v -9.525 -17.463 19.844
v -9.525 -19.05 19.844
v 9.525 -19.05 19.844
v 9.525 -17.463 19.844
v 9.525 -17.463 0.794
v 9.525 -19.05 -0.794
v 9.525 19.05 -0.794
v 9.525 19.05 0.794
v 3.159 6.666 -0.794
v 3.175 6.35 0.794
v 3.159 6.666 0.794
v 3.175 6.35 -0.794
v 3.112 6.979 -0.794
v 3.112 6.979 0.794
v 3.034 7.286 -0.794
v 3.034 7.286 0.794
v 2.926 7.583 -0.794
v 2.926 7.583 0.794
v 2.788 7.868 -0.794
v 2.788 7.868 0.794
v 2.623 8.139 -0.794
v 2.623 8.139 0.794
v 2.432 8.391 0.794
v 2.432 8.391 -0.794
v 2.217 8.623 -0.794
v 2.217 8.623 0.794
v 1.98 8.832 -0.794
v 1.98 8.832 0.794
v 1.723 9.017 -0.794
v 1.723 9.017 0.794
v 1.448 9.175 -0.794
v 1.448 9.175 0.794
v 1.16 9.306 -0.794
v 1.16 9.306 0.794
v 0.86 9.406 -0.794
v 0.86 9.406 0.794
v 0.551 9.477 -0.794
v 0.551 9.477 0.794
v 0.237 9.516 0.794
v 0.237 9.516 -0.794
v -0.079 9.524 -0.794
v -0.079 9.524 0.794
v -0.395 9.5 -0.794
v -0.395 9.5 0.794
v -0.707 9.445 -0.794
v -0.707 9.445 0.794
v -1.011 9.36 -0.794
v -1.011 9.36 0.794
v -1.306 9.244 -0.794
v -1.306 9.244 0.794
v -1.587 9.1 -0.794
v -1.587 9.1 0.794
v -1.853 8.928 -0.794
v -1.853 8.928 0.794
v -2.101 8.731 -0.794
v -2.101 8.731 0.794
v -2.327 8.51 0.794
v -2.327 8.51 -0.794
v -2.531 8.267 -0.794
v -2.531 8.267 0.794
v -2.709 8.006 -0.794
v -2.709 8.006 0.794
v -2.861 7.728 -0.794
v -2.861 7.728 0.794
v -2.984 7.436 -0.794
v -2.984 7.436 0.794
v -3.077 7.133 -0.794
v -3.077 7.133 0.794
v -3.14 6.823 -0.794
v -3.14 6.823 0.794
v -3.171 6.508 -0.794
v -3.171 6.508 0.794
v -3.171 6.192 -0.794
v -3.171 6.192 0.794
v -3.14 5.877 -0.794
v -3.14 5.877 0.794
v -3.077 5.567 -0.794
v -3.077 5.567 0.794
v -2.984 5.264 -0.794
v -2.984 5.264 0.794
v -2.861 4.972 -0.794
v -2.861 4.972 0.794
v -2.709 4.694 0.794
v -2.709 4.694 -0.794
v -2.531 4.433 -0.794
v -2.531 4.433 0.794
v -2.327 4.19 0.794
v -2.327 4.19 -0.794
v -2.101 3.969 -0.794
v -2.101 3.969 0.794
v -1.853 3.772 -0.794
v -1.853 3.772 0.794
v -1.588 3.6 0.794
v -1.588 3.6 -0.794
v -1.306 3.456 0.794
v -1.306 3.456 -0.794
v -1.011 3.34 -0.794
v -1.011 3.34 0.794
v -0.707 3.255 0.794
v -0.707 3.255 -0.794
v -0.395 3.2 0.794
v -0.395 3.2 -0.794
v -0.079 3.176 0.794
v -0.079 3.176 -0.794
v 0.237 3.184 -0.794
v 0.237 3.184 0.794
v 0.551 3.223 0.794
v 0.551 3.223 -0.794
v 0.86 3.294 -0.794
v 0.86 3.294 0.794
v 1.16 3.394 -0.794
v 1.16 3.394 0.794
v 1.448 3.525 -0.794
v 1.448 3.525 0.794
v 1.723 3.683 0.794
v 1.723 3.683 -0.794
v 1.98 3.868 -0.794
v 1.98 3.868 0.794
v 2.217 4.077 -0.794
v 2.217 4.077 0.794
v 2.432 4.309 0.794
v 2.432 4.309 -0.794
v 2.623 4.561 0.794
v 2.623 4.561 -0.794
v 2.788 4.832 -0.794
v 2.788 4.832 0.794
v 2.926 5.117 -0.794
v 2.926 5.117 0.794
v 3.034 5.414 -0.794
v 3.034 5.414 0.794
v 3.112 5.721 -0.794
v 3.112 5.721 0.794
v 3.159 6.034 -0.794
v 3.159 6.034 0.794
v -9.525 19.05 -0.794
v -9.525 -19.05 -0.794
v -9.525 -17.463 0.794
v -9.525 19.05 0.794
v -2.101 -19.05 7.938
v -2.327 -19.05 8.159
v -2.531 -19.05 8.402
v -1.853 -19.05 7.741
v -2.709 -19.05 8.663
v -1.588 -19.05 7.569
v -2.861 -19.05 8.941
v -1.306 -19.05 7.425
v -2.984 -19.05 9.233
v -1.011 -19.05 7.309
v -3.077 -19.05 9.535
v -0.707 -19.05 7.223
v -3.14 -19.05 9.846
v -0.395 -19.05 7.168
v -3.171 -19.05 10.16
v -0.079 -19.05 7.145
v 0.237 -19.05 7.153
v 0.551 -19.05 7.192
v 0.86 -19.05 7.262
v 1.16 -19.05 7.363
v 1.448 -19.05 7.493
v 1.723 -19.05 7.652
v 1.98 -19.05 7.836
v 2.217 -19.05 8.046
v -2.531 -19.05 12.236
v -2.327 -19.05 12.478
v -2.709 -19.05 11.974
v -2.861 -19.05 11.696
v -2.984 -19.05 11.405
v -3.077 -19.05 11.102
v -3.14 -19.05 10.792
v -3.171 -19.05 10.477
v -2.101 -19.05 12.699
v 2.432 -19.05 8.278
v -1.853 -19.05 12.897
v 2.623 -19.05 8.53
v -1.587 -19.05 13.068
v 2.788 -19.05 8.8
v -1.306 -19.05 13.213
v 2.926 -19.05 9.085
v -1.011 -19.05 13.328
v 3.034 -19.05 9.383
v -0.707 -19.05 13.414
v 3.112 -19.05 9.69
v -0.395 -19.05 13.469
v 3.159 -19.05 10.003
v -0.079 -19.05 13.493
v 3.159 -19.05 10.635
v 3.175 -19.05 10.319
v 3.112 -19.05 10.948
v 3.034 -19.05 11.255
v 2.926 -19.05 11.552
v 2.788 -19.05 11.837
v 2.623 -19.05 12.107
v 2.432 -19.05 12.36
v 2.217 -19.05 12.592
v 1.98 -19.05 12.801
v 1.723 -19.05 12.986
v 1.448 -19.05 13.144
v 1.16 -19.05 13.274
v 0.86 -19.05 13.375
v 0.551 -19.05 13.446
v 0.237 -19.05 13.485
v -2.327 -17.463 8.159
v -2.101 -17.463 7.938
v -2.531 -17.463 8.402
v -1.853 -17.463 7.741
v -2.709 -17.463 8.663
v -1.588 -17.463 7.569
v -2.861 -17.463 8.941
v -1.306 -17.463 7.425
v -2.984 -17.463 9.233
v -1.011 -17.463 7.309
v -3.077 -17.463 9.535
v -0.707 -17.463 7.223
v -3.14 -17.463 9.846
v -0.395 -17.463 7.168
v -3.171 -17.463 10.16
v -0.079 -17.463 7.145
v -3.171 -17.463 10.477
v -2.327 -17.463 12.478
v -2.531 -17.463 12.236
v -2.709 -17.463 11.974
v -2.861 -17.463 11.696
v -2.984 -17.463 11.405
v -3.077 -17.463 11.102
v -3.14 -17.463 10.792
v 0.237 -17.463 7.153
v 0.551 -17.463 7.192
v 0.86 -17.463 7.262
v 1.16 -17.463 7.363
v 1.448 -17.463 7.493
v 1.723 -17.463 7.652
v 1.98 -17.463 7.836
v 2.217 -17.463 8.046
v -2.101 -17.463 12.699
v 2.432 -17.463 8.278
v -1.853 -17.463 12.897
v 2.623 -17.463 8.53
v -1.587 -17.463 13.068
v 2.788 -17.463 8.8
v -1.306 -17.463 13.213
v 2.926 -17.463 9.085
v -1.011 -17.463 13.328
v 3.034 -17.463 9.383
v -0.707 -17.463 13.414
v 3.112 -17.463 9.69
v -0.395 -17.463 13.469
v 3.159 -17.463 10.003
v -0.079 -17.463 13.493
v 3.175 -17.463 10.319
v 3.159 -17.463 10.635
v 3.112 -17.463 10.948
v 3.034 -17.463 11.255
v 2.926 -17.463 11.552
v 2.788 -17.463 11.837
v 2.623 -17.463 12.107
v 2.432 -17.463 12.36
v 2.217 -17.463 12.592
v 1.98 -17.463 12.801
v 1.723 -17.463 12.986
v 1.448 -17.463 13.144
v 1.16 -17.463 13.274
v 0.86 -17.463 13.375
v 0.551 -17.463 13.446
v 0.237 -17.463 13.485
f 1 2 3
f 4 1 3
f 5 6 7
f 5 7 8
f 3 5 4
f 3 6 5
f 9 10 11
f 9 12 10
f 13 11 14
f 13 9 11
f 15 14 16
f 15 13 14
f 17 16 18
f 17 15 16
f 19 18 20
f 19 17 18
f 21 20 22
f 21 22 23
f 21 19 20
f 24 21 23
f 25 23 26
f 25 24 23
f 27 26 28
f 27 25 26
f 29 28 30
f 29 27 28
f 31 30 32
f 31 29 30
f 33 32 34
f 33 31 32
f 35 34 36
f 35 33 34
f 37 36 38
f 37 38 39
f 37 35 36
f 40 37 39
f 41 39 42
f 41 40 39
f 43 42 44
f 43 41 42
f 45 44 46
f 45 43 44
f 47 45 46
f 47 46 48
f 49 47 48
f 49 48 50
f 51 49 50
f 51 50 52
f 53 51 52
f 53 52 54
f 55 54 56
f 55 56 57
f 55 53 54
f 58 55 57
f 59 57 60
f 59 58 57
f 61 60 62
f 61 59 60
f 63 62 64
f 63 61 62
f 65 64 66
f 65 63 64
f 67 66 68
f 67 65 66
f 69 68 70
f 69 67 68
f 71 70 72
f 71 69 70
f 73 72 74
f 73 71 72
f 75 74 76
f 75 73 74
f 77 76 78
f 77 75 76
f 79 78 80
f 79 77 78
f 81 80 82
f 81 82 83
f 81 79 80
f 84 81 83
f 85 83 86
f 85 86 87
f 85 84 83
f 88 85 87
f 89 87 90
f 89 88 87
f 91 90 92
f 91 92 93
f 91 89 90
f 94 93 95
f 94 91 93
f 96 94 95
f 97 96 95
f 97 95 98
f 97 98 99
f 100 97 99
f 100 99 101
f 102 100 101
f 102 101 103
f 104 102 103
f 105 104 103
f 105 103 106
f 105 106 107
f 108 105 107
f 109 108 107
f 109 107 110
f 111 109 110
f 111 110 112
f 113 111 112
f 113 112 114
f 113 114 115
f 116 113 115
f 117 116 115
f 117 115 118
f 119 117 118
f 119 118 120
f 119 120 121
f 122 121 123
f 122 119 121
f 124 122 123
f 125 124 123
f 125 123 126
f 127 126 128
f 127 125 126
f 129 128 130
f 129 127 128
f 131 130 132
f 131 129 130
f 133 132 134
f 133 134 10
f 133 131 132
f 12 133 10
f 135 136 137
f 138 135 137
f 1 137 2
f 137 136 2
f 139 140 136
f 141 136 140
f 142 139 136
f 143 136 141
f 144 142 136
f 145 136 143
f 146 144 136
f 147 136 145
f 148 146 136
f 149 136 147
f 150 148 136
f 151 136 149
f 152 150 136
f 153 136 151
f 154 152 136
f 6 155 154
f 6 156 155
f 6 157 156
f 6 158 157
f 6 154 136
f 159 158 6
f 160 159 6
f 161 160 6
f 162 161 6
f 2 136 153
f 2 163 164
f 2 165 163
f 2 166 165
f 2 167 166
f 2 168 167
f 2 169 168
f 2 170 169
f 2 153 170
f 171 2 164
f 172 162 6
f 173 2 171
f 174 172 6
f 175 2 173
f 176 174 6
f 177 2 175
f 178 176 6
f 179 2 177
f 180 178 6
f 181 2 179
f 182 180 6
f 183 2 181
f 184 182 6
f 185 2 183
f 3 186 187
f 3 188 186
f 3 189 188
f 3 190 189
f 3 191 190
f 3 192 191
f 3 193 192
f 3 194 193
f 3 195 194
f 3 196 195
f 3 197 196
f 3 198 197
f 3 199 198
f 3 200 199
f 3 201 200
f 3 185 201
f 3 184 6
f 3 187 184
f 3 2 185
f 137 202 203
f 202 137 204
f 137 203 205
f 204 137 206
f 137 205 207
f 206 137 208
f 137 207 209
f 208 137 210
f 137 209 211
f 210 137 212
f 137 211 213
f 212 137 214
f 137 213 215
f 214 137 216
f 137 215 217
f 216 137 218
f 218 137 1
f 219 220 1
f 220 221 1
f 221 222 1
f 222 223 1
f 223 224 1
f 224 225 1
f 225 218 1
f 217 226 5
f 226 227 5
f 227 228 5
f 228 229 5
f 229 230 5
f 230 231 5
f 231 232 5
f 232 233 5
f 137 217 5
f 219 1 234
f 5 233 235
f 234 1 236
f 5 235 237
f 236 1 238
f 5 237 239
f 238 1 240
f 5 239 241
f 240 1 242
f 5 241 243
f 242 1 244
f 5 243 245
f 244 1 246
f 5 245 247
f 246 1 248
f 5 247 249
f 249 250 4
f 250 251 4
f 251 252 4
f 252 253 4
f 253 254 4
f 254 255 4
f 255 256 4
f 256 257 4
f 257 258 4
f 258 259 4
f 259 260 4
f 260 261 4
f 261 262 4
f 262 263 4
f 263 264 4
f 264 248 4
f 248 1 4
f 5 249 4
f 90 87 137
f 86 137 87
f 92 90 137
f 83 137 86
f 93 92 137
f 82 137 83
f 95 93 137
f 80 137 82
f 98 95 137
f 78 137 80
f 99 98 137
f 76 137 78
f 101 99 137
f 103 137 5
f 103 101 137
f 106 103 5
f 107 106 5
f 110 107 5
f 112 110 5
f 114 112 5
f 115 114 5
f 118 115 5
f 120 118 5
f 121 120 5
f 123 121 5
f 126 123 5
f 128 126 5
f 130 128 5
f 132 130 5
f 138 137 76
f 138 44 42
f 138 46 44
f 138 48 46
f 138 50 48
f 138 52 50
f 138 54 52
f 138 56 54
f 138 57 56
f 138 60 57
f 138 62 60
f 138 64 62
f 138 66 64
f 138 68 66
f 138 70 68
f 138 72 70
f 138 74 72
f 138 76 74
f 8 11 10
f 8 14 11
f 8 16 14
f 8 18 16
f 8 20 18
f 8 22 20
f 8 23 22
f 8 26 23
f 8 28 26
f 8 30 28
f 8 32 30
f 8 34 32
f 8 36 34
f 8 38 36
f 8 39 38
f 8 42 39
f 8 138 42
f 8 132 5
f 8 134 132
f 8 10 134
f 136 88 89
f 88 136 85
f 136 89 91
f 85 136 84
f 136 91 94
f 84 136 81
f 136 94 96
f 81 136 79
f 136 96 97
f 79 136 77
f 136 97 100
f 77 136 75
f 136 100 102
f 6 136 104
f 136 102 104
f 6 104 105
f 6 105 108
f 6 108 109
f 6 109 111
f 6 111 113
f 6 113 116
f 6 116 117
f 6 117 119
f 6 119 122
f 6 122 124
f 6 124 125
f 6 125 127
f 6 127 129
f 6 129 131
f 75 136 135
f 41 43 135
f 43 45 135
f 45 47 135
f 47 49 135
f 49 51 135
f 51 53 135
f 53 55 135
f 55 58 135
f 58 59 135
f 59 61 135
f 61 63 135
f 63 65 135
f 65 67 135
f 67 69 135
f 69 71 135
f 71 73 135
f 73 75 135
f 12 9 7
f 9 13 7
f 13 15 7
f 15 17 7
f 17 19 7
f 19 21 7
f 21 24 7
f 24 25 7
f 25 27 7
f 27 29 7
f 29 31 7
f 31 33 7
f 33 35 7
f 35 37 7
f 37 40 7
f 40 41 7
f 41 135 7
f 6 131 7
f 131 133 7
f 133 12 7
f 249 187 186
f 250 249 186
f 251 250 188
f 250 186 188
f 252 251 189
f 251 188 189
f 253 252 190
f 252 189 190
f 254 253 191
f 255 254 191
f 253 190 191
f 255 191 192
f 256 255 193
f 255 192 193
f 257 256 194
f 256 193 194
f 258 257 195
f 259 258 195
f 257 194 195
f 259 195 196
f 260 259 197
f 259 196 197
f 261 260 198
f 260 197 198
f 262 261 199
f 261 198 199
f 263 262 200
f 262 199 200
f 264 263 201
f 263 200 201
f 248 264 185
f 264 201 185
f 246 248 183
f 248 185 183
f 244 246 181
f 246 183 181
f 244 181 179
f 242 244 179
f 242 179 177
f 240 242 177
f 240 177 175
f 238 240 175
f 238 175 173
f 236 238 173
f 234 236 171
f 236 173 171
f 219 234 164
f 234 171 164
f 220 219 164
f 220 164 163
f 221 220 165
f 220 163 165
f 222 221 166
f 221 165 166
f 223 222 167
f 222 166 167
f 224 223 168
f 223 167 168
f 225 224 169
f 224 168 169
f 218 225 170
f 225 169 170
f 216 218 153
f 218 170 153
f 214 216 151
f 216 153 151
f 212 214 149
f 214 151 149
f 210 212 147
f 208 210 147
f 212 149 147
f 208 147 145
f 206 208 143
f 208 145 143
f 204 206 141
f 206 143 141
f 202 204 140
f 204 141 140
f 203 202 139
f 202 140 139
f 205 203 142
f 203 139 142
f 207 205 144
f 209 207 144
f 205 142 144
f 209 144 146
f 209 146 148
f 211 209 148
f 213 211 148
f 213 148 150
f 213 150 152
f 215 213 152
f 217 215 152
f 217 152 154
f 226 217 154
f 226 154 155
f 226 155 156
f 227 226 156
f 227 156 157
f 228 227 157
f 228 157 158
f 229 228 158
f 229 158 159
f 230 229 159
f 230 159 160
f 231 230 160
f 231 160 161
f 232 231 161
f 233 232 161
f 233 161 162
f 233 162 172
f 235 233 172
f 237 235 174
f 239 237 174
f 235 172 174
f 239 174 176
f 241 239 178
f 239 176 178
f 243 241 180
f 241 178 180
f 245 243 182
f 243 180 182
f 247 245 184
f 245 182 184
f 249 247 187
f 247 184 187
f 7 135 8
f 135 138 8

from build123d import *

# Parameters (mm, degrees)
SKETCH1_W           = 19.05
SKETCH1_H           = 38.1
SKETCH1_R           = 3.175
BOSS_EXTRUDE1_DEPTH = 0.79375
SKETCH2_W           = 19.05
SKETCH2_H           = 19.05
SKETCH2_R           = 3.175
BOSS_EXTRUDE2_DEPTH = 1.5875


with BuildPart() as part:
    # Sketch1 → Boss-Extrude1 (new body, symmetric)
    with BuildSketch(Plane.XY):
        Rectangle(SKETCH1_W, SKETCH1_H)
        with Locations((0, 6.35)):
            Circle(SKETCH1_R, mode=Mode.SUBTRACT)
    extrude(amount=BOSS_EXTRUDE1_DEPTH, both=True)

    # Sketch2 → Boss-Extrude2 (add)
    with BuildSketch(Plane.XZ.offset(19.05)):
        with Locations((0, 10.31875)):
            Rectangle(SKETCH2_W, SKETCH2_H)
        with Locations((0, 10.31875)):
            Circle(SKETCH2_R, mode=Mode.SUBTRACT)
    extrude(amount=-BOSS_EXTRUDE2_DEPTH)


solid = part.part
